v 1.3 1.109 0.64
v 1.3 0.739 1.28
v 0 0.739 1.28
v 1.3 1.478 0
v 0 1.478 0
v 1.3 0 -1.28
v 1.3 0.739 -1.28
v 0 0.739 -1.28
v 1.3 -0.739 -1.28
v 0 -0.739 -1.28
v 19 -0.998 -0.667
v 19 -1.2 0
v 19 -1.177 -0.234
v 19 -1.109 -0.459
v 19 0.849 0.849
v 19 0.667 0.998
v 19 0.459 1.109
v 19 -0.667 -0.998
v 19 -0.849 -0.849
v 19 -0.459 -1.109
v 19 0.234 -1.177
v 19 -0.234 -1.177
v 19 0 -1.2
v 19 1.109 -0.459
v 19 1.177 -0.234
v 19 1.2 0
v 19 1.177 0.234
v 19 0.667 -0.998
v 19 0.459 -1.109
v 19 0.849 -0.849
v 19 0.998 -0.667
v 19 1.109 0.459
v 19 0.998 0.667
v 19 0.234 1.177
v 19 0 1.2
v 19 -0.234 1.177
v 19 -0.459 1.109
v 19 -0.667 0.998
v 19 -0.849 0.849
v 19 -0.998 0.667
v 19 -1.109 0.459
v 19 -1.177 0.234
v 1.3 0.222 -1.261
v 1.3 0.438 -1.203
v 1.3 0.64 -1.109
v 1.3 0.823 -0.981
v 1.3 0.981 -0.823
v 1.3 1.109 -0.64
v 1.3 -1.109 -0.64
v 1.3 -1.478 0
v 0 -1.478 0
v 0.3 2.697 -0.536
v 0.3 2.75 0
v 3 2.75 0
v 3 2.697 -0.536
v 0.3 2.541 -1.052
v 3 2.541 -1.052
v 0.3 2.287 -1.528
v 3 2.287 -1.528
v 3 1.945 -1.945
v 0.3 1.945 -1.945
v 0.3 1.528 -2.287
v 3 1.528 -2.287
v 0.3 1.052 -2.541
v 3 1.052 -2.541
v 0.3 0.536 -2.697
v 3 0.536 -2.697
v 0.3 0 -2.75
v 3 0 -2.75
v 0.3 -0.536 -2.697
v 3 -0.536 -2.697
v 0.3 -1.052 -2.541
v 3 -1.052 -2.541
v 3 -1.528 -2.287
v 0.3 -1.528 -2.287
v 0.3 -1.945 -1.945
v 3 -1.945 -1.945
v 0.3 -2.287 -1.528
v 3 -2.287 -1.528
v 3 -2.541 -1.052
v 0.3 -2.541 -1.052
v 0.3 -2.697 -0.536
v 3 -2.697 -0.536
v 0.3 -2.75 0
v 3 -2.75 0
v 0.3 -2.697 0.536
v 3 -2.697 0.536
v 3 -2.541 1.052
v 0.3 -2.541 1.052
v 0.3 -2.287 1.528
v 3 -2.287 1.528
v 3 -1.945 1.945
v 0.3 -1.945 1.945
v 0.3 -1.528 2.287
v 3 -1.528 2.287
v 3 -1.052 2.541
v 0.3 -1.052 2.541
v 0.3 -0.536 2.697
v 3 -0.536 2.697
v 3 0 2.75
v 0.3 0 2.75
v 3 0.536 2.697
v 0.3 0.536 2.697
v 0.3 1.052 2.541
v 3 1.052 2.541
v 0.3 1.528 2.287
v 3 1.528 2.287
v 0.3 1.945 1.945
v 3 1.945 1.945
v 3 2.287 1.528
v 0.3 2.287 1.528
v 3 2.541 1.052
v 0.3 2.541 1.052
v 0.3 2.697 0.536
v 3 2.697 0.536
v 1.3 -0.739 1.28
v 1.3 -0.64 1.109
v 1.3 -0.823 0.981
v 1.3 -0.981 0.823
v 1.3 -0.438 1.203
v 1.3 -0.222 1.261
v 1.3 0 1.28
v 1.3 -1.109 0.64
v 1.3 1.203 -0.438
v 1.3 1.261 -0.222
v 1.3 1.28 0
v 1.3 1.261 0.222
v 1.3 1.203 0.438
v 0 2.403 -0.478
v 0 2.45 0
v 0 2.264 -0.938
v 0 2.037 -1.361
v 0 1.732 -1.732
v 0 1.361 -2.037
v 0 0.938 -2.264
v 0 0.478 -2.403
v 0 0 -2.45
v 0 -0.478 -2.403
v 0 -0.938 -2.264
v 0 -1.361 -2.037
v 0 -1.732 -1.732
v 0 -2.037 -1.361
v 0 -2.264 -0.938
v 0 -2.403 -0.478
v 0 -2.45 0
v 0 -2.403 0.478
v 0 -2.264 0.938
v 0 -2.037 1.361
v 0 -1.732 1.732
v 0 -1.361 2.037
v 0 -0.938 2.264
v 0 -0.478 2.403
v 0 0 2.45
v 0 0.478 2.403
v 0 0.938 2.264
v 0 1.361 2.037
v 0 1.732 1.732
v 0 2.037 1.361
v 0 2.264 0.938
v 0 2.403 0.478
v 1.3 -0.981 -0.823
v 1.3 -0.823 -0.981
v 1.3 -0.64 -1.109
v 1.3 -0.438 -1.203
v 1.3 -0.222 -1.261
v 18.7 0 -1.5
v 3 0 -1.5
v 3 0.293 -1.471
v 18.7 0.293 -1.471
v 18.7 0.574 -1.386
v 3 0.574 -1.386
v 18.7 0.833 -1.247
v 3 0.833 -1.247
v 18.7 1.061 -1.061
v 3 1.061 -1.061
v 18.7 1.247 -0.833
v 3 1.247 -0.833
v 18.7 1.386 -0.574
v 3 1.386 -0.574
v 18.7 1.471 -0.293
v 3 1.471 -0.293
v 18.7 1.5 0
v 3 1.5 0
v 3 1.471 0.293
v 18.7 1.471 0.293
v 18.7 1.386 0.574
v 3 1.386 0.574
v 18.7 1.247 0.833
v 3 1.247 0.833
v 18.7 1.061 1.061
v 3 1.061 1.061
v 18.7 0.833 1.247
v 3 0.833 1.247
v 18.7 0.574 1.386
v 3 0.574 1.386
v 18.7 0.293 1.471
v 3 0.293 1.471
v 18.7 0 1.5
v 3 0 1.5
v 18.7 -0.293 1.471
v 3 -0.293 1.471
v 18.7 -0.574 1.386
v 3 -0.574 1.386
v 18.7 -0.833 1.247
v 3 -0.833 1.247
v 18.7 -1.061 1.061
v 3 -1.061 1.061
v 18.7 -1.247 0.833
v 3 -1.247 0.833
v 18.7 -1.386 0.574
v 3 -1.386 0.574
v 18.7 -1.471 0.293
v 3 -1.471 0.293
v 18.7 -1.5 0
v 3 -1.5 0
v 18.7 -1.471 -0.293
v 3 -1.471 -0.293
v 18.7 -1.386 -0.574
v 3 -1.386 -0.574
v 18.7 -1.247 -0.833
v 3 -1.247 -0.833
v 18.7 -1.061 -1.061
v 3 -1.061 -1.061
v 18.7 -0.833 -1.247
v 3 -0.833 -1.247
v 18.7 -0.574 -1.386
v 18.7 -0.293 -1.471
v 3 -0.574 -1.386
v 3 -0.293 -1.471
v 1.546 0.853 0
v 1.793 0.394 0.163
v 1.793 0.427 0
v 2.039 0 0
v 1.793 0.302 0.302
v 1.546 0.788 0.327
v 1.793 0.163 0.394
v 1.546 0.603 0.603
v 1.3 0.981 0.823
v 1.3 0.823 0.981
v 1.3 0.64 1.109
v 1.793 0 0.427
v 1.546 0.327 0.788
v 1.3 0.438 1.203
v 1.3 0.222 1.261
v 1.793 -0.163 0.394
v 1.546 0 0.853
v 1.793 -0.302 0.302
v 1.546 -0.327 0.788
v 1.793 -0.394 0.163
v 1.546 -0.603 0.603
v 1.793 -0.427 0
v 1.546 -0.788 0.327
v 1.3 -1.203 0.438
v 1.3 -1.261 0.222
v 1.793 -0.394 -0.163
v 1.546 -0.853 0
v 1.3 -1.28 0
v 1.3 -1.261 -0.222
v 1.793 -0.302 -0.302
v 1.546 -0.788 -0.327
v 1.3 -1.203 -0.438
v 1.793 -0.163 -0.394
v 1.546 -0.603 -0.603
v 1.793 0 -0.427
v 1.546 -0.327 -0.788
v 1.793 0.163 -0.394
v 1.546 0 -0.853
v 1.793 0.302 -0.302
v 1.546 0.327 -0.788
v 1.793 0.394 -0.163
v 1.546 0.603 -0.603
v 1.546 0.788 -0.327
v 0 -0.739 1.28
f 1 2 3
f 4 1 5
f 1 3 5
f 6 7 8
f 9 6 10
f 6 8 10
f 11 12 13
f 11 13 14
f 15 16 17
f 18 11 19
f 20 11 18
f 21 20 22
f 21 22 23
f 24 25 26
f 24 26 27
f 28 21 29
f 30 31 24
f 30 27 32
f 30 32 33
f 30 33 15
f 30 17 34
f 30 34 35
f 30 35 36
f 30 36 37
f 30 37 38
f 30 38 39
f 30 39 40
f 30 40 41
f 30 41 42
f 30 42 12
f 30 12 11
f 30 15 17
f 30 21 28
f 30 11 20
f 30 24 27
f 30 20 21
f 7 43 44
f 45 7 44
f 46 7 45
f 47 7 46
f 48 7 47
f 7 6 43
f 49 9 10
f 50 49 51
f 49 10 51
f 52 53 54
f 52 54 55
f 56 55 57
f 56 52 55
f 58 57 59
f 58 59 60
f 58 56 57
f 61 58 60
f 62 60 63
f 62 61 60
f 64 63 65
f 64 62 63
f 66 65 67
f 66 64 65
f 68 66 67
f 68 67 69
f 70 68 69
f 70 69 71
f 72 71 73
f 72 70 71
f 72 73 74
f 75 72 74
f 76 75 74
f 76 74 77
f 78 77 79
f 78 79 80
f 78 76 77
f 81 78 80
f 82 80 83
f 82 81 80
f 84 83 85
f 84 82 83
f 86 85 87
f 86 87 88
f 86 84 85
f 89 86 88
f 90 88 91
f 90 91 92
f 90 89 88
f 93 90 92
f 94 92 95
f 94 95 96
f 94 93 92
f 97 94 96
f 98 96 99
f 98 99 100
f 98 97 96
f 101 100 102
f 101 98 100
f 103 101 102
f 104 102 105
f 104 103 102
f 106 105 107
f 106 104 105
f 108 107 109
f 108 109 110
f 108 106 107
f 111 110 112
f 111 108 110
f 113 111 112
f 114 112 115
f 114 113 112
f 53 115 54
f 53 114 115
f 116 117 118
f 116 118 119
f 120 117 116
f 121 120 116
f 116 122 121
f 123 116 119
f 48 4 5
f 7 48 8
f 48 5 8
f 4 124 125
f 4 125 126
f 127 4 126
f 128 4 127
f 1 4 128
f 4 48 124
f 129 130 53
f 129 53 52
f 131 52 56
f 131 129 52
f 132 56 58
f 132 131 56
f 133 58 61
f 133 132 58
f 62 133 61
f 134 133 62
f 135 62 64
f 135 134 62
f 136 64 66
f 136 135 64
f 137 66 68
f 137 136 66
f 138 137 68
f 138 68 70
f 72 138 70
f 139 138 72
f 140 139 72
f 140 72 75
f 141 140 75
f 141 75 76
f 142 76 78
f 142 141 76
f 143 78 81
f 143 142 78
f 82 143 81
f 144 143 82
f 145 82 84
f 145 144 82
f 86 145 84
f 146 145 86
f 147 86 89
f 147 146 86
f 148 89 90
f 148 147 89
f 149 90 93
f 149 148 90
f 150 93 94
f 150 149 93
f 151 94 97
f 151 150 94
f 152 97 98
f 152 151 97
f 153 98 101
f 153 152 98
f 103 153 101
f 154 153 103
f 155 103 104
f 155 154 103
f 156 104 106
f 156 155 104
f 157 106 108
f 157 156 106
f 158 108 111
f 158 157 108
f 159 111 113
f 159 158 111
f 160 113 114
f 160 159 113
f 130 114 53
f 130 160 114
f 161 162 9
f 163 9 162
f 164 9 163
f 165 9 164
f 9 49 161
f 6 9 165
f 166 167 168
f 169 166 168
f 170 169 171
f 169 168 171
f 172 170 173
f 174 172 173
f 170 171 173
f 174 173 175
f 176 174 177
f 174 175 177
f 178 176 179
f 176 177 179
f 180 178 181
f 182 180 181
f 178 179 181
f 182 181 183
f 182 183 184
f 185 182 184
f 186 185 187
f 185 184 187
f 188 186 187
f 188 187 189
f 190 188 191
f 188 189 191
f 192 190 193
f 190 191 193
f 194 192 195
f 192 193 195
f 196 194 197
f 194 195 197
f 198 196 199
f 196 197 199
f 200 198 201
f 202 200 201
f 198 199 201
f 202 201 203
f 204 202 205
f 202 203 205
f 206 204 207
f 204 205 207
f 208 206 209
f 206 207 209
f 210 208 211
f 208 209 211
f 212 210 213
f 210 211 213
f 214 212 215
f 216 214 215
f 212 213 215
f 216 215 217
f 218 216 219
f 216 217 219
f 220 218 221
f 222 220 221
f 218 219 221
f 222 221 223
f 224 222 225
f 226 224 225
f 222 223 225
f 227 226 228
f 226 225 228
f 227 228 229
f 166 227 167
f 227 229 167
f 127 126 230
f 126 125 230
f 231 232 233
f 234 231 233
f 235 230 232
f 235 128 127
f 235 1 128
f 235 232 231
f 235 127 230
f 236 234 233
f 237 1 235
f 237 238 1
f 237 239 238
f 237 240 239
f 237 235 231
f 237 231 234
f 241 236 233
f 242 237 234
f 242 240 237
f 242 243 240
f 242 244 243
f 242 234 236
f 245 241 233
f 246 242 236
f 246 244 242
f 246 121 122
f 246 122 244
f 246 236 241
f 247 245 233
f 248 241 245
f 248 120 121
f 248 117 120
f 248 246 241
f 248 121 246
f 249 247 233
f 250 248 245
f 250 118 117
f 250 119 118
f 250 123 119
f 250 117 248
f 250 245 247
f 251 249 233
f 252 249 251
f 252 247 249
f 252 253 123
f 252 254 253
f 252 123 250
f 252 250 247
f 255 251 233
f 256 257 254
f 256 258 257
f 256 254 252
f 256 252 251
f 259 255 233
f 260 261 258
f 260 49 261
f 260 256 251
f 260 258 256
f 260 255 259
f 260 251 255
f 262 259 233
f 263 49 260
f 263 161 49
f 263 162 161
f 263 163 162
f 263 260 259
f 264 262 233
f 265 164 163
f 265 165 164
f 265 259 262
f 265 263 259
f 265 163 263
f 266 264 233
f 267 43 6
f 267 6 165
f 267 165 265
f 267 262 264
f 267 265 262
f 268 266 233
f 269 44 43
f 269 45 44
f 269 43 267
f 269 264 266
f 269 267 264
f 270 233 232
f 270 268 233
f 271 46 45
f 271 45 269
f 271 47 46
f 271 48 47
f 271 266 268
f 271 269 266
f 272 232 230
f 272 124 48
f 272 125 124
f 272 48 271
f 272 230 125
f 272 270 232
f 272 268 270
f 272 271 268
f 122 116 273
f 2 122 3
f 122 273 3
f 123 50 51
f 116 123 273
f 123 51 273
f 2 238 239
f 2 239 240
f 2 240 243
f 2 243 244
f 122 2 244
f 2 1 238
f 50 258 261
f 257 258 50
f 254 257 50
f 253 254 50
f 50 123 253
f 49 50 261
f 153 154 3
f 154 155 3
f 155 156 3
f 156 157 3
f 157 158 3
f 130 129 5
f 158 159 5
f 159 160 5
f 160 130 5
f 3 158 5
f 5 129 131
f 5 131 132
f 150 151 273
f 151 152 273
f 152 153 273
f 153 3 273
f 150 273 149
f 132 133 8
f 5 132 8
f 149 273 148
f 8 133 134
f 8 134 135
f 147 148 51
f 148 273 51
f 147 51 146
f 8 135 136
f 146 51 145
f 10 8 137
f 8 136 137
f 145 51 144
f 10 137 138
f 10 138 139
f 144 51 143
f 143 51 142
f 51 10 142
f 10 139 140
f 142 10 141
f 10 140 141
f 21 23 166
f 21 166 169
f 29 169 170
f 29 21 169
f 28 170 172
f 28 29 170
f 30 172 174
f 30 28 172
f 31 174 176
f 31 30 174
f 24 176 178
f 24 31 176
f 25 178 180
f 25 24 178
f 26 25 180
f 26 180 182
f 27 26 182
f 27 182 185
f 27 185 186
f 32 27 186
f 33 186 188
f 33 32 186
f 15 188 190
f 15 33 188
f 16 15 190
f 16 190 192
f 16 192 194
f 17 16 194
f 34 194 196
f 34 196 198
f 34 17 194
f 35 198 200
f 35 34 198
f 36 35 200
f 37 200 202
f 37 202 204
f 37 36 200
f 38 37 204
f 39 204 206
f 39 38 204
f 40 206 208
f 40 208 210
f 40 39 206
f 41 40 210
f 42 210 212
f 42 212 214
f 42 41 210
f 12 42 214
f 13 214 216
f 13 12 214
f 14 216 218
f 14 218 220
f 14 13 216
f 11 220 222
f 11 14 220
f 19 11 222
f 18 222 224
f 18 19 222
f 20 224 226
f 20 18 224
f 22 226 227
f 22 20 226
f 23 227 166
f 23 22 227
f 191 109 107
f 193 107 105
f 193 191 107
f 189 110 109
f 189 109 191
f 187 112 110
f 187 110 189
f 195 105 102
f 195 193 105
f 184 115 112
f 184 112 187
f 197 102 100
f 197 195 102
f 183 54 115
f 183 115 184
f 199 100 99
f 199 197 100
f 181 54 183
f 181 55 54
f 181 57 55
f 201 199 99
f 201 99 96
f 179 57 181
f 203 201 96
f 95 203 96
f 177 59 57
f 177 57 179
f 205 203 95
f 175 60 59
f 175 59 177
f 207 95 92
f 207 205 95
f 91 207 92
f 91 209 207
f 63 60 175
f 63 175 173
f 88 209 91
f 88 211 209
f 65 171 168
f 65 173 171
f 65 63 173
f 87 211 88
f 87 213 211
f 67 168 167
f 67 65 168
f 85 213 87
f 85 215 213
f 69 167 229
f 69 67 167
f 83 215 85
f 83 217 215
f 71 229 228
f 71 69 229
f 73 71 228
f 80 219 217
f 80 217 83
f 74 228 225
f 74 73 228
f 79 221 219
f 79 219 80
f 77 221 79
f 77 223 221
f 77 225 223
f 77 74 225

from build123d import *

# Parameters (mm, degrees)
SKETCH_1_W          = 3
SKETCH_1_H          = 2.75
SKETCH_2_R          = 1.5
EXTRUDE_1_DEPTH     = 16
CUT_EXTRUDE_1_DEPTH = 1.3
CHAMFER_1_SIZE      = 0.3


with BuildPart() as part:
    # 草图1 → 旋转1 (revolve)
    with BuildSketch(Plane(origin=(0, 0, 0), x_dir=(-1, 0, 0), z_dir=(0, 0, -1))):
        with Locations((-1.5, 1.375)):
            Rectangle(SKETCH_1_W, SKETCH_1_H)
    revolve(axis=Axis((3, 0, 0), (-1, 0, 0)))

    # 草图2 → 凸台-拉伸1 (add)
    with BuildSketch(Plane(origin=(3, 0, 0), x_dir=(0, 0, -1), z_dir=(1, 0, 0))):
        Circle(SKETCH_2_R)
    extrude(amount=EXTRUDE_1_DEPTH)

    # 草图3 → 切除-拉伸1 (cut)
    with BuildSketch(Plane.ZY):
        Polygon((1.28, 0.739008345), (0, 1.478016689), (-1.28, 0.739008345), (-1.28, -0.739008345), (0, -1.478016689), (1.28, -0.739008345), align=None)
    extrude(amount=-CUT_EXTRUDE_1_DEPTH, mode=Mode.SUBTRACT)

    # 草图4 → 切除-旋转1 (revolve, cut)
    with BuildSketch(Plane.XY):
        Polygon((1.3, 1.28), (1.3, 0), (2.039008345, 0), align=None)
    revolve(axis=Axis((1.3, 0, 0), (1, 0, 0)), mode=Mode.SUBTRACT)

    # 倒角1
    chamfer_1_edges = [part.edges().sort_by_distance(p)[0] for p in [
        (19, 0, 1.5),
        (0, -2.75, 0),
    ]]
    chamfer(chamfer_1_edges, length=CHAMFER_1_SIZE)


solid = part.part
